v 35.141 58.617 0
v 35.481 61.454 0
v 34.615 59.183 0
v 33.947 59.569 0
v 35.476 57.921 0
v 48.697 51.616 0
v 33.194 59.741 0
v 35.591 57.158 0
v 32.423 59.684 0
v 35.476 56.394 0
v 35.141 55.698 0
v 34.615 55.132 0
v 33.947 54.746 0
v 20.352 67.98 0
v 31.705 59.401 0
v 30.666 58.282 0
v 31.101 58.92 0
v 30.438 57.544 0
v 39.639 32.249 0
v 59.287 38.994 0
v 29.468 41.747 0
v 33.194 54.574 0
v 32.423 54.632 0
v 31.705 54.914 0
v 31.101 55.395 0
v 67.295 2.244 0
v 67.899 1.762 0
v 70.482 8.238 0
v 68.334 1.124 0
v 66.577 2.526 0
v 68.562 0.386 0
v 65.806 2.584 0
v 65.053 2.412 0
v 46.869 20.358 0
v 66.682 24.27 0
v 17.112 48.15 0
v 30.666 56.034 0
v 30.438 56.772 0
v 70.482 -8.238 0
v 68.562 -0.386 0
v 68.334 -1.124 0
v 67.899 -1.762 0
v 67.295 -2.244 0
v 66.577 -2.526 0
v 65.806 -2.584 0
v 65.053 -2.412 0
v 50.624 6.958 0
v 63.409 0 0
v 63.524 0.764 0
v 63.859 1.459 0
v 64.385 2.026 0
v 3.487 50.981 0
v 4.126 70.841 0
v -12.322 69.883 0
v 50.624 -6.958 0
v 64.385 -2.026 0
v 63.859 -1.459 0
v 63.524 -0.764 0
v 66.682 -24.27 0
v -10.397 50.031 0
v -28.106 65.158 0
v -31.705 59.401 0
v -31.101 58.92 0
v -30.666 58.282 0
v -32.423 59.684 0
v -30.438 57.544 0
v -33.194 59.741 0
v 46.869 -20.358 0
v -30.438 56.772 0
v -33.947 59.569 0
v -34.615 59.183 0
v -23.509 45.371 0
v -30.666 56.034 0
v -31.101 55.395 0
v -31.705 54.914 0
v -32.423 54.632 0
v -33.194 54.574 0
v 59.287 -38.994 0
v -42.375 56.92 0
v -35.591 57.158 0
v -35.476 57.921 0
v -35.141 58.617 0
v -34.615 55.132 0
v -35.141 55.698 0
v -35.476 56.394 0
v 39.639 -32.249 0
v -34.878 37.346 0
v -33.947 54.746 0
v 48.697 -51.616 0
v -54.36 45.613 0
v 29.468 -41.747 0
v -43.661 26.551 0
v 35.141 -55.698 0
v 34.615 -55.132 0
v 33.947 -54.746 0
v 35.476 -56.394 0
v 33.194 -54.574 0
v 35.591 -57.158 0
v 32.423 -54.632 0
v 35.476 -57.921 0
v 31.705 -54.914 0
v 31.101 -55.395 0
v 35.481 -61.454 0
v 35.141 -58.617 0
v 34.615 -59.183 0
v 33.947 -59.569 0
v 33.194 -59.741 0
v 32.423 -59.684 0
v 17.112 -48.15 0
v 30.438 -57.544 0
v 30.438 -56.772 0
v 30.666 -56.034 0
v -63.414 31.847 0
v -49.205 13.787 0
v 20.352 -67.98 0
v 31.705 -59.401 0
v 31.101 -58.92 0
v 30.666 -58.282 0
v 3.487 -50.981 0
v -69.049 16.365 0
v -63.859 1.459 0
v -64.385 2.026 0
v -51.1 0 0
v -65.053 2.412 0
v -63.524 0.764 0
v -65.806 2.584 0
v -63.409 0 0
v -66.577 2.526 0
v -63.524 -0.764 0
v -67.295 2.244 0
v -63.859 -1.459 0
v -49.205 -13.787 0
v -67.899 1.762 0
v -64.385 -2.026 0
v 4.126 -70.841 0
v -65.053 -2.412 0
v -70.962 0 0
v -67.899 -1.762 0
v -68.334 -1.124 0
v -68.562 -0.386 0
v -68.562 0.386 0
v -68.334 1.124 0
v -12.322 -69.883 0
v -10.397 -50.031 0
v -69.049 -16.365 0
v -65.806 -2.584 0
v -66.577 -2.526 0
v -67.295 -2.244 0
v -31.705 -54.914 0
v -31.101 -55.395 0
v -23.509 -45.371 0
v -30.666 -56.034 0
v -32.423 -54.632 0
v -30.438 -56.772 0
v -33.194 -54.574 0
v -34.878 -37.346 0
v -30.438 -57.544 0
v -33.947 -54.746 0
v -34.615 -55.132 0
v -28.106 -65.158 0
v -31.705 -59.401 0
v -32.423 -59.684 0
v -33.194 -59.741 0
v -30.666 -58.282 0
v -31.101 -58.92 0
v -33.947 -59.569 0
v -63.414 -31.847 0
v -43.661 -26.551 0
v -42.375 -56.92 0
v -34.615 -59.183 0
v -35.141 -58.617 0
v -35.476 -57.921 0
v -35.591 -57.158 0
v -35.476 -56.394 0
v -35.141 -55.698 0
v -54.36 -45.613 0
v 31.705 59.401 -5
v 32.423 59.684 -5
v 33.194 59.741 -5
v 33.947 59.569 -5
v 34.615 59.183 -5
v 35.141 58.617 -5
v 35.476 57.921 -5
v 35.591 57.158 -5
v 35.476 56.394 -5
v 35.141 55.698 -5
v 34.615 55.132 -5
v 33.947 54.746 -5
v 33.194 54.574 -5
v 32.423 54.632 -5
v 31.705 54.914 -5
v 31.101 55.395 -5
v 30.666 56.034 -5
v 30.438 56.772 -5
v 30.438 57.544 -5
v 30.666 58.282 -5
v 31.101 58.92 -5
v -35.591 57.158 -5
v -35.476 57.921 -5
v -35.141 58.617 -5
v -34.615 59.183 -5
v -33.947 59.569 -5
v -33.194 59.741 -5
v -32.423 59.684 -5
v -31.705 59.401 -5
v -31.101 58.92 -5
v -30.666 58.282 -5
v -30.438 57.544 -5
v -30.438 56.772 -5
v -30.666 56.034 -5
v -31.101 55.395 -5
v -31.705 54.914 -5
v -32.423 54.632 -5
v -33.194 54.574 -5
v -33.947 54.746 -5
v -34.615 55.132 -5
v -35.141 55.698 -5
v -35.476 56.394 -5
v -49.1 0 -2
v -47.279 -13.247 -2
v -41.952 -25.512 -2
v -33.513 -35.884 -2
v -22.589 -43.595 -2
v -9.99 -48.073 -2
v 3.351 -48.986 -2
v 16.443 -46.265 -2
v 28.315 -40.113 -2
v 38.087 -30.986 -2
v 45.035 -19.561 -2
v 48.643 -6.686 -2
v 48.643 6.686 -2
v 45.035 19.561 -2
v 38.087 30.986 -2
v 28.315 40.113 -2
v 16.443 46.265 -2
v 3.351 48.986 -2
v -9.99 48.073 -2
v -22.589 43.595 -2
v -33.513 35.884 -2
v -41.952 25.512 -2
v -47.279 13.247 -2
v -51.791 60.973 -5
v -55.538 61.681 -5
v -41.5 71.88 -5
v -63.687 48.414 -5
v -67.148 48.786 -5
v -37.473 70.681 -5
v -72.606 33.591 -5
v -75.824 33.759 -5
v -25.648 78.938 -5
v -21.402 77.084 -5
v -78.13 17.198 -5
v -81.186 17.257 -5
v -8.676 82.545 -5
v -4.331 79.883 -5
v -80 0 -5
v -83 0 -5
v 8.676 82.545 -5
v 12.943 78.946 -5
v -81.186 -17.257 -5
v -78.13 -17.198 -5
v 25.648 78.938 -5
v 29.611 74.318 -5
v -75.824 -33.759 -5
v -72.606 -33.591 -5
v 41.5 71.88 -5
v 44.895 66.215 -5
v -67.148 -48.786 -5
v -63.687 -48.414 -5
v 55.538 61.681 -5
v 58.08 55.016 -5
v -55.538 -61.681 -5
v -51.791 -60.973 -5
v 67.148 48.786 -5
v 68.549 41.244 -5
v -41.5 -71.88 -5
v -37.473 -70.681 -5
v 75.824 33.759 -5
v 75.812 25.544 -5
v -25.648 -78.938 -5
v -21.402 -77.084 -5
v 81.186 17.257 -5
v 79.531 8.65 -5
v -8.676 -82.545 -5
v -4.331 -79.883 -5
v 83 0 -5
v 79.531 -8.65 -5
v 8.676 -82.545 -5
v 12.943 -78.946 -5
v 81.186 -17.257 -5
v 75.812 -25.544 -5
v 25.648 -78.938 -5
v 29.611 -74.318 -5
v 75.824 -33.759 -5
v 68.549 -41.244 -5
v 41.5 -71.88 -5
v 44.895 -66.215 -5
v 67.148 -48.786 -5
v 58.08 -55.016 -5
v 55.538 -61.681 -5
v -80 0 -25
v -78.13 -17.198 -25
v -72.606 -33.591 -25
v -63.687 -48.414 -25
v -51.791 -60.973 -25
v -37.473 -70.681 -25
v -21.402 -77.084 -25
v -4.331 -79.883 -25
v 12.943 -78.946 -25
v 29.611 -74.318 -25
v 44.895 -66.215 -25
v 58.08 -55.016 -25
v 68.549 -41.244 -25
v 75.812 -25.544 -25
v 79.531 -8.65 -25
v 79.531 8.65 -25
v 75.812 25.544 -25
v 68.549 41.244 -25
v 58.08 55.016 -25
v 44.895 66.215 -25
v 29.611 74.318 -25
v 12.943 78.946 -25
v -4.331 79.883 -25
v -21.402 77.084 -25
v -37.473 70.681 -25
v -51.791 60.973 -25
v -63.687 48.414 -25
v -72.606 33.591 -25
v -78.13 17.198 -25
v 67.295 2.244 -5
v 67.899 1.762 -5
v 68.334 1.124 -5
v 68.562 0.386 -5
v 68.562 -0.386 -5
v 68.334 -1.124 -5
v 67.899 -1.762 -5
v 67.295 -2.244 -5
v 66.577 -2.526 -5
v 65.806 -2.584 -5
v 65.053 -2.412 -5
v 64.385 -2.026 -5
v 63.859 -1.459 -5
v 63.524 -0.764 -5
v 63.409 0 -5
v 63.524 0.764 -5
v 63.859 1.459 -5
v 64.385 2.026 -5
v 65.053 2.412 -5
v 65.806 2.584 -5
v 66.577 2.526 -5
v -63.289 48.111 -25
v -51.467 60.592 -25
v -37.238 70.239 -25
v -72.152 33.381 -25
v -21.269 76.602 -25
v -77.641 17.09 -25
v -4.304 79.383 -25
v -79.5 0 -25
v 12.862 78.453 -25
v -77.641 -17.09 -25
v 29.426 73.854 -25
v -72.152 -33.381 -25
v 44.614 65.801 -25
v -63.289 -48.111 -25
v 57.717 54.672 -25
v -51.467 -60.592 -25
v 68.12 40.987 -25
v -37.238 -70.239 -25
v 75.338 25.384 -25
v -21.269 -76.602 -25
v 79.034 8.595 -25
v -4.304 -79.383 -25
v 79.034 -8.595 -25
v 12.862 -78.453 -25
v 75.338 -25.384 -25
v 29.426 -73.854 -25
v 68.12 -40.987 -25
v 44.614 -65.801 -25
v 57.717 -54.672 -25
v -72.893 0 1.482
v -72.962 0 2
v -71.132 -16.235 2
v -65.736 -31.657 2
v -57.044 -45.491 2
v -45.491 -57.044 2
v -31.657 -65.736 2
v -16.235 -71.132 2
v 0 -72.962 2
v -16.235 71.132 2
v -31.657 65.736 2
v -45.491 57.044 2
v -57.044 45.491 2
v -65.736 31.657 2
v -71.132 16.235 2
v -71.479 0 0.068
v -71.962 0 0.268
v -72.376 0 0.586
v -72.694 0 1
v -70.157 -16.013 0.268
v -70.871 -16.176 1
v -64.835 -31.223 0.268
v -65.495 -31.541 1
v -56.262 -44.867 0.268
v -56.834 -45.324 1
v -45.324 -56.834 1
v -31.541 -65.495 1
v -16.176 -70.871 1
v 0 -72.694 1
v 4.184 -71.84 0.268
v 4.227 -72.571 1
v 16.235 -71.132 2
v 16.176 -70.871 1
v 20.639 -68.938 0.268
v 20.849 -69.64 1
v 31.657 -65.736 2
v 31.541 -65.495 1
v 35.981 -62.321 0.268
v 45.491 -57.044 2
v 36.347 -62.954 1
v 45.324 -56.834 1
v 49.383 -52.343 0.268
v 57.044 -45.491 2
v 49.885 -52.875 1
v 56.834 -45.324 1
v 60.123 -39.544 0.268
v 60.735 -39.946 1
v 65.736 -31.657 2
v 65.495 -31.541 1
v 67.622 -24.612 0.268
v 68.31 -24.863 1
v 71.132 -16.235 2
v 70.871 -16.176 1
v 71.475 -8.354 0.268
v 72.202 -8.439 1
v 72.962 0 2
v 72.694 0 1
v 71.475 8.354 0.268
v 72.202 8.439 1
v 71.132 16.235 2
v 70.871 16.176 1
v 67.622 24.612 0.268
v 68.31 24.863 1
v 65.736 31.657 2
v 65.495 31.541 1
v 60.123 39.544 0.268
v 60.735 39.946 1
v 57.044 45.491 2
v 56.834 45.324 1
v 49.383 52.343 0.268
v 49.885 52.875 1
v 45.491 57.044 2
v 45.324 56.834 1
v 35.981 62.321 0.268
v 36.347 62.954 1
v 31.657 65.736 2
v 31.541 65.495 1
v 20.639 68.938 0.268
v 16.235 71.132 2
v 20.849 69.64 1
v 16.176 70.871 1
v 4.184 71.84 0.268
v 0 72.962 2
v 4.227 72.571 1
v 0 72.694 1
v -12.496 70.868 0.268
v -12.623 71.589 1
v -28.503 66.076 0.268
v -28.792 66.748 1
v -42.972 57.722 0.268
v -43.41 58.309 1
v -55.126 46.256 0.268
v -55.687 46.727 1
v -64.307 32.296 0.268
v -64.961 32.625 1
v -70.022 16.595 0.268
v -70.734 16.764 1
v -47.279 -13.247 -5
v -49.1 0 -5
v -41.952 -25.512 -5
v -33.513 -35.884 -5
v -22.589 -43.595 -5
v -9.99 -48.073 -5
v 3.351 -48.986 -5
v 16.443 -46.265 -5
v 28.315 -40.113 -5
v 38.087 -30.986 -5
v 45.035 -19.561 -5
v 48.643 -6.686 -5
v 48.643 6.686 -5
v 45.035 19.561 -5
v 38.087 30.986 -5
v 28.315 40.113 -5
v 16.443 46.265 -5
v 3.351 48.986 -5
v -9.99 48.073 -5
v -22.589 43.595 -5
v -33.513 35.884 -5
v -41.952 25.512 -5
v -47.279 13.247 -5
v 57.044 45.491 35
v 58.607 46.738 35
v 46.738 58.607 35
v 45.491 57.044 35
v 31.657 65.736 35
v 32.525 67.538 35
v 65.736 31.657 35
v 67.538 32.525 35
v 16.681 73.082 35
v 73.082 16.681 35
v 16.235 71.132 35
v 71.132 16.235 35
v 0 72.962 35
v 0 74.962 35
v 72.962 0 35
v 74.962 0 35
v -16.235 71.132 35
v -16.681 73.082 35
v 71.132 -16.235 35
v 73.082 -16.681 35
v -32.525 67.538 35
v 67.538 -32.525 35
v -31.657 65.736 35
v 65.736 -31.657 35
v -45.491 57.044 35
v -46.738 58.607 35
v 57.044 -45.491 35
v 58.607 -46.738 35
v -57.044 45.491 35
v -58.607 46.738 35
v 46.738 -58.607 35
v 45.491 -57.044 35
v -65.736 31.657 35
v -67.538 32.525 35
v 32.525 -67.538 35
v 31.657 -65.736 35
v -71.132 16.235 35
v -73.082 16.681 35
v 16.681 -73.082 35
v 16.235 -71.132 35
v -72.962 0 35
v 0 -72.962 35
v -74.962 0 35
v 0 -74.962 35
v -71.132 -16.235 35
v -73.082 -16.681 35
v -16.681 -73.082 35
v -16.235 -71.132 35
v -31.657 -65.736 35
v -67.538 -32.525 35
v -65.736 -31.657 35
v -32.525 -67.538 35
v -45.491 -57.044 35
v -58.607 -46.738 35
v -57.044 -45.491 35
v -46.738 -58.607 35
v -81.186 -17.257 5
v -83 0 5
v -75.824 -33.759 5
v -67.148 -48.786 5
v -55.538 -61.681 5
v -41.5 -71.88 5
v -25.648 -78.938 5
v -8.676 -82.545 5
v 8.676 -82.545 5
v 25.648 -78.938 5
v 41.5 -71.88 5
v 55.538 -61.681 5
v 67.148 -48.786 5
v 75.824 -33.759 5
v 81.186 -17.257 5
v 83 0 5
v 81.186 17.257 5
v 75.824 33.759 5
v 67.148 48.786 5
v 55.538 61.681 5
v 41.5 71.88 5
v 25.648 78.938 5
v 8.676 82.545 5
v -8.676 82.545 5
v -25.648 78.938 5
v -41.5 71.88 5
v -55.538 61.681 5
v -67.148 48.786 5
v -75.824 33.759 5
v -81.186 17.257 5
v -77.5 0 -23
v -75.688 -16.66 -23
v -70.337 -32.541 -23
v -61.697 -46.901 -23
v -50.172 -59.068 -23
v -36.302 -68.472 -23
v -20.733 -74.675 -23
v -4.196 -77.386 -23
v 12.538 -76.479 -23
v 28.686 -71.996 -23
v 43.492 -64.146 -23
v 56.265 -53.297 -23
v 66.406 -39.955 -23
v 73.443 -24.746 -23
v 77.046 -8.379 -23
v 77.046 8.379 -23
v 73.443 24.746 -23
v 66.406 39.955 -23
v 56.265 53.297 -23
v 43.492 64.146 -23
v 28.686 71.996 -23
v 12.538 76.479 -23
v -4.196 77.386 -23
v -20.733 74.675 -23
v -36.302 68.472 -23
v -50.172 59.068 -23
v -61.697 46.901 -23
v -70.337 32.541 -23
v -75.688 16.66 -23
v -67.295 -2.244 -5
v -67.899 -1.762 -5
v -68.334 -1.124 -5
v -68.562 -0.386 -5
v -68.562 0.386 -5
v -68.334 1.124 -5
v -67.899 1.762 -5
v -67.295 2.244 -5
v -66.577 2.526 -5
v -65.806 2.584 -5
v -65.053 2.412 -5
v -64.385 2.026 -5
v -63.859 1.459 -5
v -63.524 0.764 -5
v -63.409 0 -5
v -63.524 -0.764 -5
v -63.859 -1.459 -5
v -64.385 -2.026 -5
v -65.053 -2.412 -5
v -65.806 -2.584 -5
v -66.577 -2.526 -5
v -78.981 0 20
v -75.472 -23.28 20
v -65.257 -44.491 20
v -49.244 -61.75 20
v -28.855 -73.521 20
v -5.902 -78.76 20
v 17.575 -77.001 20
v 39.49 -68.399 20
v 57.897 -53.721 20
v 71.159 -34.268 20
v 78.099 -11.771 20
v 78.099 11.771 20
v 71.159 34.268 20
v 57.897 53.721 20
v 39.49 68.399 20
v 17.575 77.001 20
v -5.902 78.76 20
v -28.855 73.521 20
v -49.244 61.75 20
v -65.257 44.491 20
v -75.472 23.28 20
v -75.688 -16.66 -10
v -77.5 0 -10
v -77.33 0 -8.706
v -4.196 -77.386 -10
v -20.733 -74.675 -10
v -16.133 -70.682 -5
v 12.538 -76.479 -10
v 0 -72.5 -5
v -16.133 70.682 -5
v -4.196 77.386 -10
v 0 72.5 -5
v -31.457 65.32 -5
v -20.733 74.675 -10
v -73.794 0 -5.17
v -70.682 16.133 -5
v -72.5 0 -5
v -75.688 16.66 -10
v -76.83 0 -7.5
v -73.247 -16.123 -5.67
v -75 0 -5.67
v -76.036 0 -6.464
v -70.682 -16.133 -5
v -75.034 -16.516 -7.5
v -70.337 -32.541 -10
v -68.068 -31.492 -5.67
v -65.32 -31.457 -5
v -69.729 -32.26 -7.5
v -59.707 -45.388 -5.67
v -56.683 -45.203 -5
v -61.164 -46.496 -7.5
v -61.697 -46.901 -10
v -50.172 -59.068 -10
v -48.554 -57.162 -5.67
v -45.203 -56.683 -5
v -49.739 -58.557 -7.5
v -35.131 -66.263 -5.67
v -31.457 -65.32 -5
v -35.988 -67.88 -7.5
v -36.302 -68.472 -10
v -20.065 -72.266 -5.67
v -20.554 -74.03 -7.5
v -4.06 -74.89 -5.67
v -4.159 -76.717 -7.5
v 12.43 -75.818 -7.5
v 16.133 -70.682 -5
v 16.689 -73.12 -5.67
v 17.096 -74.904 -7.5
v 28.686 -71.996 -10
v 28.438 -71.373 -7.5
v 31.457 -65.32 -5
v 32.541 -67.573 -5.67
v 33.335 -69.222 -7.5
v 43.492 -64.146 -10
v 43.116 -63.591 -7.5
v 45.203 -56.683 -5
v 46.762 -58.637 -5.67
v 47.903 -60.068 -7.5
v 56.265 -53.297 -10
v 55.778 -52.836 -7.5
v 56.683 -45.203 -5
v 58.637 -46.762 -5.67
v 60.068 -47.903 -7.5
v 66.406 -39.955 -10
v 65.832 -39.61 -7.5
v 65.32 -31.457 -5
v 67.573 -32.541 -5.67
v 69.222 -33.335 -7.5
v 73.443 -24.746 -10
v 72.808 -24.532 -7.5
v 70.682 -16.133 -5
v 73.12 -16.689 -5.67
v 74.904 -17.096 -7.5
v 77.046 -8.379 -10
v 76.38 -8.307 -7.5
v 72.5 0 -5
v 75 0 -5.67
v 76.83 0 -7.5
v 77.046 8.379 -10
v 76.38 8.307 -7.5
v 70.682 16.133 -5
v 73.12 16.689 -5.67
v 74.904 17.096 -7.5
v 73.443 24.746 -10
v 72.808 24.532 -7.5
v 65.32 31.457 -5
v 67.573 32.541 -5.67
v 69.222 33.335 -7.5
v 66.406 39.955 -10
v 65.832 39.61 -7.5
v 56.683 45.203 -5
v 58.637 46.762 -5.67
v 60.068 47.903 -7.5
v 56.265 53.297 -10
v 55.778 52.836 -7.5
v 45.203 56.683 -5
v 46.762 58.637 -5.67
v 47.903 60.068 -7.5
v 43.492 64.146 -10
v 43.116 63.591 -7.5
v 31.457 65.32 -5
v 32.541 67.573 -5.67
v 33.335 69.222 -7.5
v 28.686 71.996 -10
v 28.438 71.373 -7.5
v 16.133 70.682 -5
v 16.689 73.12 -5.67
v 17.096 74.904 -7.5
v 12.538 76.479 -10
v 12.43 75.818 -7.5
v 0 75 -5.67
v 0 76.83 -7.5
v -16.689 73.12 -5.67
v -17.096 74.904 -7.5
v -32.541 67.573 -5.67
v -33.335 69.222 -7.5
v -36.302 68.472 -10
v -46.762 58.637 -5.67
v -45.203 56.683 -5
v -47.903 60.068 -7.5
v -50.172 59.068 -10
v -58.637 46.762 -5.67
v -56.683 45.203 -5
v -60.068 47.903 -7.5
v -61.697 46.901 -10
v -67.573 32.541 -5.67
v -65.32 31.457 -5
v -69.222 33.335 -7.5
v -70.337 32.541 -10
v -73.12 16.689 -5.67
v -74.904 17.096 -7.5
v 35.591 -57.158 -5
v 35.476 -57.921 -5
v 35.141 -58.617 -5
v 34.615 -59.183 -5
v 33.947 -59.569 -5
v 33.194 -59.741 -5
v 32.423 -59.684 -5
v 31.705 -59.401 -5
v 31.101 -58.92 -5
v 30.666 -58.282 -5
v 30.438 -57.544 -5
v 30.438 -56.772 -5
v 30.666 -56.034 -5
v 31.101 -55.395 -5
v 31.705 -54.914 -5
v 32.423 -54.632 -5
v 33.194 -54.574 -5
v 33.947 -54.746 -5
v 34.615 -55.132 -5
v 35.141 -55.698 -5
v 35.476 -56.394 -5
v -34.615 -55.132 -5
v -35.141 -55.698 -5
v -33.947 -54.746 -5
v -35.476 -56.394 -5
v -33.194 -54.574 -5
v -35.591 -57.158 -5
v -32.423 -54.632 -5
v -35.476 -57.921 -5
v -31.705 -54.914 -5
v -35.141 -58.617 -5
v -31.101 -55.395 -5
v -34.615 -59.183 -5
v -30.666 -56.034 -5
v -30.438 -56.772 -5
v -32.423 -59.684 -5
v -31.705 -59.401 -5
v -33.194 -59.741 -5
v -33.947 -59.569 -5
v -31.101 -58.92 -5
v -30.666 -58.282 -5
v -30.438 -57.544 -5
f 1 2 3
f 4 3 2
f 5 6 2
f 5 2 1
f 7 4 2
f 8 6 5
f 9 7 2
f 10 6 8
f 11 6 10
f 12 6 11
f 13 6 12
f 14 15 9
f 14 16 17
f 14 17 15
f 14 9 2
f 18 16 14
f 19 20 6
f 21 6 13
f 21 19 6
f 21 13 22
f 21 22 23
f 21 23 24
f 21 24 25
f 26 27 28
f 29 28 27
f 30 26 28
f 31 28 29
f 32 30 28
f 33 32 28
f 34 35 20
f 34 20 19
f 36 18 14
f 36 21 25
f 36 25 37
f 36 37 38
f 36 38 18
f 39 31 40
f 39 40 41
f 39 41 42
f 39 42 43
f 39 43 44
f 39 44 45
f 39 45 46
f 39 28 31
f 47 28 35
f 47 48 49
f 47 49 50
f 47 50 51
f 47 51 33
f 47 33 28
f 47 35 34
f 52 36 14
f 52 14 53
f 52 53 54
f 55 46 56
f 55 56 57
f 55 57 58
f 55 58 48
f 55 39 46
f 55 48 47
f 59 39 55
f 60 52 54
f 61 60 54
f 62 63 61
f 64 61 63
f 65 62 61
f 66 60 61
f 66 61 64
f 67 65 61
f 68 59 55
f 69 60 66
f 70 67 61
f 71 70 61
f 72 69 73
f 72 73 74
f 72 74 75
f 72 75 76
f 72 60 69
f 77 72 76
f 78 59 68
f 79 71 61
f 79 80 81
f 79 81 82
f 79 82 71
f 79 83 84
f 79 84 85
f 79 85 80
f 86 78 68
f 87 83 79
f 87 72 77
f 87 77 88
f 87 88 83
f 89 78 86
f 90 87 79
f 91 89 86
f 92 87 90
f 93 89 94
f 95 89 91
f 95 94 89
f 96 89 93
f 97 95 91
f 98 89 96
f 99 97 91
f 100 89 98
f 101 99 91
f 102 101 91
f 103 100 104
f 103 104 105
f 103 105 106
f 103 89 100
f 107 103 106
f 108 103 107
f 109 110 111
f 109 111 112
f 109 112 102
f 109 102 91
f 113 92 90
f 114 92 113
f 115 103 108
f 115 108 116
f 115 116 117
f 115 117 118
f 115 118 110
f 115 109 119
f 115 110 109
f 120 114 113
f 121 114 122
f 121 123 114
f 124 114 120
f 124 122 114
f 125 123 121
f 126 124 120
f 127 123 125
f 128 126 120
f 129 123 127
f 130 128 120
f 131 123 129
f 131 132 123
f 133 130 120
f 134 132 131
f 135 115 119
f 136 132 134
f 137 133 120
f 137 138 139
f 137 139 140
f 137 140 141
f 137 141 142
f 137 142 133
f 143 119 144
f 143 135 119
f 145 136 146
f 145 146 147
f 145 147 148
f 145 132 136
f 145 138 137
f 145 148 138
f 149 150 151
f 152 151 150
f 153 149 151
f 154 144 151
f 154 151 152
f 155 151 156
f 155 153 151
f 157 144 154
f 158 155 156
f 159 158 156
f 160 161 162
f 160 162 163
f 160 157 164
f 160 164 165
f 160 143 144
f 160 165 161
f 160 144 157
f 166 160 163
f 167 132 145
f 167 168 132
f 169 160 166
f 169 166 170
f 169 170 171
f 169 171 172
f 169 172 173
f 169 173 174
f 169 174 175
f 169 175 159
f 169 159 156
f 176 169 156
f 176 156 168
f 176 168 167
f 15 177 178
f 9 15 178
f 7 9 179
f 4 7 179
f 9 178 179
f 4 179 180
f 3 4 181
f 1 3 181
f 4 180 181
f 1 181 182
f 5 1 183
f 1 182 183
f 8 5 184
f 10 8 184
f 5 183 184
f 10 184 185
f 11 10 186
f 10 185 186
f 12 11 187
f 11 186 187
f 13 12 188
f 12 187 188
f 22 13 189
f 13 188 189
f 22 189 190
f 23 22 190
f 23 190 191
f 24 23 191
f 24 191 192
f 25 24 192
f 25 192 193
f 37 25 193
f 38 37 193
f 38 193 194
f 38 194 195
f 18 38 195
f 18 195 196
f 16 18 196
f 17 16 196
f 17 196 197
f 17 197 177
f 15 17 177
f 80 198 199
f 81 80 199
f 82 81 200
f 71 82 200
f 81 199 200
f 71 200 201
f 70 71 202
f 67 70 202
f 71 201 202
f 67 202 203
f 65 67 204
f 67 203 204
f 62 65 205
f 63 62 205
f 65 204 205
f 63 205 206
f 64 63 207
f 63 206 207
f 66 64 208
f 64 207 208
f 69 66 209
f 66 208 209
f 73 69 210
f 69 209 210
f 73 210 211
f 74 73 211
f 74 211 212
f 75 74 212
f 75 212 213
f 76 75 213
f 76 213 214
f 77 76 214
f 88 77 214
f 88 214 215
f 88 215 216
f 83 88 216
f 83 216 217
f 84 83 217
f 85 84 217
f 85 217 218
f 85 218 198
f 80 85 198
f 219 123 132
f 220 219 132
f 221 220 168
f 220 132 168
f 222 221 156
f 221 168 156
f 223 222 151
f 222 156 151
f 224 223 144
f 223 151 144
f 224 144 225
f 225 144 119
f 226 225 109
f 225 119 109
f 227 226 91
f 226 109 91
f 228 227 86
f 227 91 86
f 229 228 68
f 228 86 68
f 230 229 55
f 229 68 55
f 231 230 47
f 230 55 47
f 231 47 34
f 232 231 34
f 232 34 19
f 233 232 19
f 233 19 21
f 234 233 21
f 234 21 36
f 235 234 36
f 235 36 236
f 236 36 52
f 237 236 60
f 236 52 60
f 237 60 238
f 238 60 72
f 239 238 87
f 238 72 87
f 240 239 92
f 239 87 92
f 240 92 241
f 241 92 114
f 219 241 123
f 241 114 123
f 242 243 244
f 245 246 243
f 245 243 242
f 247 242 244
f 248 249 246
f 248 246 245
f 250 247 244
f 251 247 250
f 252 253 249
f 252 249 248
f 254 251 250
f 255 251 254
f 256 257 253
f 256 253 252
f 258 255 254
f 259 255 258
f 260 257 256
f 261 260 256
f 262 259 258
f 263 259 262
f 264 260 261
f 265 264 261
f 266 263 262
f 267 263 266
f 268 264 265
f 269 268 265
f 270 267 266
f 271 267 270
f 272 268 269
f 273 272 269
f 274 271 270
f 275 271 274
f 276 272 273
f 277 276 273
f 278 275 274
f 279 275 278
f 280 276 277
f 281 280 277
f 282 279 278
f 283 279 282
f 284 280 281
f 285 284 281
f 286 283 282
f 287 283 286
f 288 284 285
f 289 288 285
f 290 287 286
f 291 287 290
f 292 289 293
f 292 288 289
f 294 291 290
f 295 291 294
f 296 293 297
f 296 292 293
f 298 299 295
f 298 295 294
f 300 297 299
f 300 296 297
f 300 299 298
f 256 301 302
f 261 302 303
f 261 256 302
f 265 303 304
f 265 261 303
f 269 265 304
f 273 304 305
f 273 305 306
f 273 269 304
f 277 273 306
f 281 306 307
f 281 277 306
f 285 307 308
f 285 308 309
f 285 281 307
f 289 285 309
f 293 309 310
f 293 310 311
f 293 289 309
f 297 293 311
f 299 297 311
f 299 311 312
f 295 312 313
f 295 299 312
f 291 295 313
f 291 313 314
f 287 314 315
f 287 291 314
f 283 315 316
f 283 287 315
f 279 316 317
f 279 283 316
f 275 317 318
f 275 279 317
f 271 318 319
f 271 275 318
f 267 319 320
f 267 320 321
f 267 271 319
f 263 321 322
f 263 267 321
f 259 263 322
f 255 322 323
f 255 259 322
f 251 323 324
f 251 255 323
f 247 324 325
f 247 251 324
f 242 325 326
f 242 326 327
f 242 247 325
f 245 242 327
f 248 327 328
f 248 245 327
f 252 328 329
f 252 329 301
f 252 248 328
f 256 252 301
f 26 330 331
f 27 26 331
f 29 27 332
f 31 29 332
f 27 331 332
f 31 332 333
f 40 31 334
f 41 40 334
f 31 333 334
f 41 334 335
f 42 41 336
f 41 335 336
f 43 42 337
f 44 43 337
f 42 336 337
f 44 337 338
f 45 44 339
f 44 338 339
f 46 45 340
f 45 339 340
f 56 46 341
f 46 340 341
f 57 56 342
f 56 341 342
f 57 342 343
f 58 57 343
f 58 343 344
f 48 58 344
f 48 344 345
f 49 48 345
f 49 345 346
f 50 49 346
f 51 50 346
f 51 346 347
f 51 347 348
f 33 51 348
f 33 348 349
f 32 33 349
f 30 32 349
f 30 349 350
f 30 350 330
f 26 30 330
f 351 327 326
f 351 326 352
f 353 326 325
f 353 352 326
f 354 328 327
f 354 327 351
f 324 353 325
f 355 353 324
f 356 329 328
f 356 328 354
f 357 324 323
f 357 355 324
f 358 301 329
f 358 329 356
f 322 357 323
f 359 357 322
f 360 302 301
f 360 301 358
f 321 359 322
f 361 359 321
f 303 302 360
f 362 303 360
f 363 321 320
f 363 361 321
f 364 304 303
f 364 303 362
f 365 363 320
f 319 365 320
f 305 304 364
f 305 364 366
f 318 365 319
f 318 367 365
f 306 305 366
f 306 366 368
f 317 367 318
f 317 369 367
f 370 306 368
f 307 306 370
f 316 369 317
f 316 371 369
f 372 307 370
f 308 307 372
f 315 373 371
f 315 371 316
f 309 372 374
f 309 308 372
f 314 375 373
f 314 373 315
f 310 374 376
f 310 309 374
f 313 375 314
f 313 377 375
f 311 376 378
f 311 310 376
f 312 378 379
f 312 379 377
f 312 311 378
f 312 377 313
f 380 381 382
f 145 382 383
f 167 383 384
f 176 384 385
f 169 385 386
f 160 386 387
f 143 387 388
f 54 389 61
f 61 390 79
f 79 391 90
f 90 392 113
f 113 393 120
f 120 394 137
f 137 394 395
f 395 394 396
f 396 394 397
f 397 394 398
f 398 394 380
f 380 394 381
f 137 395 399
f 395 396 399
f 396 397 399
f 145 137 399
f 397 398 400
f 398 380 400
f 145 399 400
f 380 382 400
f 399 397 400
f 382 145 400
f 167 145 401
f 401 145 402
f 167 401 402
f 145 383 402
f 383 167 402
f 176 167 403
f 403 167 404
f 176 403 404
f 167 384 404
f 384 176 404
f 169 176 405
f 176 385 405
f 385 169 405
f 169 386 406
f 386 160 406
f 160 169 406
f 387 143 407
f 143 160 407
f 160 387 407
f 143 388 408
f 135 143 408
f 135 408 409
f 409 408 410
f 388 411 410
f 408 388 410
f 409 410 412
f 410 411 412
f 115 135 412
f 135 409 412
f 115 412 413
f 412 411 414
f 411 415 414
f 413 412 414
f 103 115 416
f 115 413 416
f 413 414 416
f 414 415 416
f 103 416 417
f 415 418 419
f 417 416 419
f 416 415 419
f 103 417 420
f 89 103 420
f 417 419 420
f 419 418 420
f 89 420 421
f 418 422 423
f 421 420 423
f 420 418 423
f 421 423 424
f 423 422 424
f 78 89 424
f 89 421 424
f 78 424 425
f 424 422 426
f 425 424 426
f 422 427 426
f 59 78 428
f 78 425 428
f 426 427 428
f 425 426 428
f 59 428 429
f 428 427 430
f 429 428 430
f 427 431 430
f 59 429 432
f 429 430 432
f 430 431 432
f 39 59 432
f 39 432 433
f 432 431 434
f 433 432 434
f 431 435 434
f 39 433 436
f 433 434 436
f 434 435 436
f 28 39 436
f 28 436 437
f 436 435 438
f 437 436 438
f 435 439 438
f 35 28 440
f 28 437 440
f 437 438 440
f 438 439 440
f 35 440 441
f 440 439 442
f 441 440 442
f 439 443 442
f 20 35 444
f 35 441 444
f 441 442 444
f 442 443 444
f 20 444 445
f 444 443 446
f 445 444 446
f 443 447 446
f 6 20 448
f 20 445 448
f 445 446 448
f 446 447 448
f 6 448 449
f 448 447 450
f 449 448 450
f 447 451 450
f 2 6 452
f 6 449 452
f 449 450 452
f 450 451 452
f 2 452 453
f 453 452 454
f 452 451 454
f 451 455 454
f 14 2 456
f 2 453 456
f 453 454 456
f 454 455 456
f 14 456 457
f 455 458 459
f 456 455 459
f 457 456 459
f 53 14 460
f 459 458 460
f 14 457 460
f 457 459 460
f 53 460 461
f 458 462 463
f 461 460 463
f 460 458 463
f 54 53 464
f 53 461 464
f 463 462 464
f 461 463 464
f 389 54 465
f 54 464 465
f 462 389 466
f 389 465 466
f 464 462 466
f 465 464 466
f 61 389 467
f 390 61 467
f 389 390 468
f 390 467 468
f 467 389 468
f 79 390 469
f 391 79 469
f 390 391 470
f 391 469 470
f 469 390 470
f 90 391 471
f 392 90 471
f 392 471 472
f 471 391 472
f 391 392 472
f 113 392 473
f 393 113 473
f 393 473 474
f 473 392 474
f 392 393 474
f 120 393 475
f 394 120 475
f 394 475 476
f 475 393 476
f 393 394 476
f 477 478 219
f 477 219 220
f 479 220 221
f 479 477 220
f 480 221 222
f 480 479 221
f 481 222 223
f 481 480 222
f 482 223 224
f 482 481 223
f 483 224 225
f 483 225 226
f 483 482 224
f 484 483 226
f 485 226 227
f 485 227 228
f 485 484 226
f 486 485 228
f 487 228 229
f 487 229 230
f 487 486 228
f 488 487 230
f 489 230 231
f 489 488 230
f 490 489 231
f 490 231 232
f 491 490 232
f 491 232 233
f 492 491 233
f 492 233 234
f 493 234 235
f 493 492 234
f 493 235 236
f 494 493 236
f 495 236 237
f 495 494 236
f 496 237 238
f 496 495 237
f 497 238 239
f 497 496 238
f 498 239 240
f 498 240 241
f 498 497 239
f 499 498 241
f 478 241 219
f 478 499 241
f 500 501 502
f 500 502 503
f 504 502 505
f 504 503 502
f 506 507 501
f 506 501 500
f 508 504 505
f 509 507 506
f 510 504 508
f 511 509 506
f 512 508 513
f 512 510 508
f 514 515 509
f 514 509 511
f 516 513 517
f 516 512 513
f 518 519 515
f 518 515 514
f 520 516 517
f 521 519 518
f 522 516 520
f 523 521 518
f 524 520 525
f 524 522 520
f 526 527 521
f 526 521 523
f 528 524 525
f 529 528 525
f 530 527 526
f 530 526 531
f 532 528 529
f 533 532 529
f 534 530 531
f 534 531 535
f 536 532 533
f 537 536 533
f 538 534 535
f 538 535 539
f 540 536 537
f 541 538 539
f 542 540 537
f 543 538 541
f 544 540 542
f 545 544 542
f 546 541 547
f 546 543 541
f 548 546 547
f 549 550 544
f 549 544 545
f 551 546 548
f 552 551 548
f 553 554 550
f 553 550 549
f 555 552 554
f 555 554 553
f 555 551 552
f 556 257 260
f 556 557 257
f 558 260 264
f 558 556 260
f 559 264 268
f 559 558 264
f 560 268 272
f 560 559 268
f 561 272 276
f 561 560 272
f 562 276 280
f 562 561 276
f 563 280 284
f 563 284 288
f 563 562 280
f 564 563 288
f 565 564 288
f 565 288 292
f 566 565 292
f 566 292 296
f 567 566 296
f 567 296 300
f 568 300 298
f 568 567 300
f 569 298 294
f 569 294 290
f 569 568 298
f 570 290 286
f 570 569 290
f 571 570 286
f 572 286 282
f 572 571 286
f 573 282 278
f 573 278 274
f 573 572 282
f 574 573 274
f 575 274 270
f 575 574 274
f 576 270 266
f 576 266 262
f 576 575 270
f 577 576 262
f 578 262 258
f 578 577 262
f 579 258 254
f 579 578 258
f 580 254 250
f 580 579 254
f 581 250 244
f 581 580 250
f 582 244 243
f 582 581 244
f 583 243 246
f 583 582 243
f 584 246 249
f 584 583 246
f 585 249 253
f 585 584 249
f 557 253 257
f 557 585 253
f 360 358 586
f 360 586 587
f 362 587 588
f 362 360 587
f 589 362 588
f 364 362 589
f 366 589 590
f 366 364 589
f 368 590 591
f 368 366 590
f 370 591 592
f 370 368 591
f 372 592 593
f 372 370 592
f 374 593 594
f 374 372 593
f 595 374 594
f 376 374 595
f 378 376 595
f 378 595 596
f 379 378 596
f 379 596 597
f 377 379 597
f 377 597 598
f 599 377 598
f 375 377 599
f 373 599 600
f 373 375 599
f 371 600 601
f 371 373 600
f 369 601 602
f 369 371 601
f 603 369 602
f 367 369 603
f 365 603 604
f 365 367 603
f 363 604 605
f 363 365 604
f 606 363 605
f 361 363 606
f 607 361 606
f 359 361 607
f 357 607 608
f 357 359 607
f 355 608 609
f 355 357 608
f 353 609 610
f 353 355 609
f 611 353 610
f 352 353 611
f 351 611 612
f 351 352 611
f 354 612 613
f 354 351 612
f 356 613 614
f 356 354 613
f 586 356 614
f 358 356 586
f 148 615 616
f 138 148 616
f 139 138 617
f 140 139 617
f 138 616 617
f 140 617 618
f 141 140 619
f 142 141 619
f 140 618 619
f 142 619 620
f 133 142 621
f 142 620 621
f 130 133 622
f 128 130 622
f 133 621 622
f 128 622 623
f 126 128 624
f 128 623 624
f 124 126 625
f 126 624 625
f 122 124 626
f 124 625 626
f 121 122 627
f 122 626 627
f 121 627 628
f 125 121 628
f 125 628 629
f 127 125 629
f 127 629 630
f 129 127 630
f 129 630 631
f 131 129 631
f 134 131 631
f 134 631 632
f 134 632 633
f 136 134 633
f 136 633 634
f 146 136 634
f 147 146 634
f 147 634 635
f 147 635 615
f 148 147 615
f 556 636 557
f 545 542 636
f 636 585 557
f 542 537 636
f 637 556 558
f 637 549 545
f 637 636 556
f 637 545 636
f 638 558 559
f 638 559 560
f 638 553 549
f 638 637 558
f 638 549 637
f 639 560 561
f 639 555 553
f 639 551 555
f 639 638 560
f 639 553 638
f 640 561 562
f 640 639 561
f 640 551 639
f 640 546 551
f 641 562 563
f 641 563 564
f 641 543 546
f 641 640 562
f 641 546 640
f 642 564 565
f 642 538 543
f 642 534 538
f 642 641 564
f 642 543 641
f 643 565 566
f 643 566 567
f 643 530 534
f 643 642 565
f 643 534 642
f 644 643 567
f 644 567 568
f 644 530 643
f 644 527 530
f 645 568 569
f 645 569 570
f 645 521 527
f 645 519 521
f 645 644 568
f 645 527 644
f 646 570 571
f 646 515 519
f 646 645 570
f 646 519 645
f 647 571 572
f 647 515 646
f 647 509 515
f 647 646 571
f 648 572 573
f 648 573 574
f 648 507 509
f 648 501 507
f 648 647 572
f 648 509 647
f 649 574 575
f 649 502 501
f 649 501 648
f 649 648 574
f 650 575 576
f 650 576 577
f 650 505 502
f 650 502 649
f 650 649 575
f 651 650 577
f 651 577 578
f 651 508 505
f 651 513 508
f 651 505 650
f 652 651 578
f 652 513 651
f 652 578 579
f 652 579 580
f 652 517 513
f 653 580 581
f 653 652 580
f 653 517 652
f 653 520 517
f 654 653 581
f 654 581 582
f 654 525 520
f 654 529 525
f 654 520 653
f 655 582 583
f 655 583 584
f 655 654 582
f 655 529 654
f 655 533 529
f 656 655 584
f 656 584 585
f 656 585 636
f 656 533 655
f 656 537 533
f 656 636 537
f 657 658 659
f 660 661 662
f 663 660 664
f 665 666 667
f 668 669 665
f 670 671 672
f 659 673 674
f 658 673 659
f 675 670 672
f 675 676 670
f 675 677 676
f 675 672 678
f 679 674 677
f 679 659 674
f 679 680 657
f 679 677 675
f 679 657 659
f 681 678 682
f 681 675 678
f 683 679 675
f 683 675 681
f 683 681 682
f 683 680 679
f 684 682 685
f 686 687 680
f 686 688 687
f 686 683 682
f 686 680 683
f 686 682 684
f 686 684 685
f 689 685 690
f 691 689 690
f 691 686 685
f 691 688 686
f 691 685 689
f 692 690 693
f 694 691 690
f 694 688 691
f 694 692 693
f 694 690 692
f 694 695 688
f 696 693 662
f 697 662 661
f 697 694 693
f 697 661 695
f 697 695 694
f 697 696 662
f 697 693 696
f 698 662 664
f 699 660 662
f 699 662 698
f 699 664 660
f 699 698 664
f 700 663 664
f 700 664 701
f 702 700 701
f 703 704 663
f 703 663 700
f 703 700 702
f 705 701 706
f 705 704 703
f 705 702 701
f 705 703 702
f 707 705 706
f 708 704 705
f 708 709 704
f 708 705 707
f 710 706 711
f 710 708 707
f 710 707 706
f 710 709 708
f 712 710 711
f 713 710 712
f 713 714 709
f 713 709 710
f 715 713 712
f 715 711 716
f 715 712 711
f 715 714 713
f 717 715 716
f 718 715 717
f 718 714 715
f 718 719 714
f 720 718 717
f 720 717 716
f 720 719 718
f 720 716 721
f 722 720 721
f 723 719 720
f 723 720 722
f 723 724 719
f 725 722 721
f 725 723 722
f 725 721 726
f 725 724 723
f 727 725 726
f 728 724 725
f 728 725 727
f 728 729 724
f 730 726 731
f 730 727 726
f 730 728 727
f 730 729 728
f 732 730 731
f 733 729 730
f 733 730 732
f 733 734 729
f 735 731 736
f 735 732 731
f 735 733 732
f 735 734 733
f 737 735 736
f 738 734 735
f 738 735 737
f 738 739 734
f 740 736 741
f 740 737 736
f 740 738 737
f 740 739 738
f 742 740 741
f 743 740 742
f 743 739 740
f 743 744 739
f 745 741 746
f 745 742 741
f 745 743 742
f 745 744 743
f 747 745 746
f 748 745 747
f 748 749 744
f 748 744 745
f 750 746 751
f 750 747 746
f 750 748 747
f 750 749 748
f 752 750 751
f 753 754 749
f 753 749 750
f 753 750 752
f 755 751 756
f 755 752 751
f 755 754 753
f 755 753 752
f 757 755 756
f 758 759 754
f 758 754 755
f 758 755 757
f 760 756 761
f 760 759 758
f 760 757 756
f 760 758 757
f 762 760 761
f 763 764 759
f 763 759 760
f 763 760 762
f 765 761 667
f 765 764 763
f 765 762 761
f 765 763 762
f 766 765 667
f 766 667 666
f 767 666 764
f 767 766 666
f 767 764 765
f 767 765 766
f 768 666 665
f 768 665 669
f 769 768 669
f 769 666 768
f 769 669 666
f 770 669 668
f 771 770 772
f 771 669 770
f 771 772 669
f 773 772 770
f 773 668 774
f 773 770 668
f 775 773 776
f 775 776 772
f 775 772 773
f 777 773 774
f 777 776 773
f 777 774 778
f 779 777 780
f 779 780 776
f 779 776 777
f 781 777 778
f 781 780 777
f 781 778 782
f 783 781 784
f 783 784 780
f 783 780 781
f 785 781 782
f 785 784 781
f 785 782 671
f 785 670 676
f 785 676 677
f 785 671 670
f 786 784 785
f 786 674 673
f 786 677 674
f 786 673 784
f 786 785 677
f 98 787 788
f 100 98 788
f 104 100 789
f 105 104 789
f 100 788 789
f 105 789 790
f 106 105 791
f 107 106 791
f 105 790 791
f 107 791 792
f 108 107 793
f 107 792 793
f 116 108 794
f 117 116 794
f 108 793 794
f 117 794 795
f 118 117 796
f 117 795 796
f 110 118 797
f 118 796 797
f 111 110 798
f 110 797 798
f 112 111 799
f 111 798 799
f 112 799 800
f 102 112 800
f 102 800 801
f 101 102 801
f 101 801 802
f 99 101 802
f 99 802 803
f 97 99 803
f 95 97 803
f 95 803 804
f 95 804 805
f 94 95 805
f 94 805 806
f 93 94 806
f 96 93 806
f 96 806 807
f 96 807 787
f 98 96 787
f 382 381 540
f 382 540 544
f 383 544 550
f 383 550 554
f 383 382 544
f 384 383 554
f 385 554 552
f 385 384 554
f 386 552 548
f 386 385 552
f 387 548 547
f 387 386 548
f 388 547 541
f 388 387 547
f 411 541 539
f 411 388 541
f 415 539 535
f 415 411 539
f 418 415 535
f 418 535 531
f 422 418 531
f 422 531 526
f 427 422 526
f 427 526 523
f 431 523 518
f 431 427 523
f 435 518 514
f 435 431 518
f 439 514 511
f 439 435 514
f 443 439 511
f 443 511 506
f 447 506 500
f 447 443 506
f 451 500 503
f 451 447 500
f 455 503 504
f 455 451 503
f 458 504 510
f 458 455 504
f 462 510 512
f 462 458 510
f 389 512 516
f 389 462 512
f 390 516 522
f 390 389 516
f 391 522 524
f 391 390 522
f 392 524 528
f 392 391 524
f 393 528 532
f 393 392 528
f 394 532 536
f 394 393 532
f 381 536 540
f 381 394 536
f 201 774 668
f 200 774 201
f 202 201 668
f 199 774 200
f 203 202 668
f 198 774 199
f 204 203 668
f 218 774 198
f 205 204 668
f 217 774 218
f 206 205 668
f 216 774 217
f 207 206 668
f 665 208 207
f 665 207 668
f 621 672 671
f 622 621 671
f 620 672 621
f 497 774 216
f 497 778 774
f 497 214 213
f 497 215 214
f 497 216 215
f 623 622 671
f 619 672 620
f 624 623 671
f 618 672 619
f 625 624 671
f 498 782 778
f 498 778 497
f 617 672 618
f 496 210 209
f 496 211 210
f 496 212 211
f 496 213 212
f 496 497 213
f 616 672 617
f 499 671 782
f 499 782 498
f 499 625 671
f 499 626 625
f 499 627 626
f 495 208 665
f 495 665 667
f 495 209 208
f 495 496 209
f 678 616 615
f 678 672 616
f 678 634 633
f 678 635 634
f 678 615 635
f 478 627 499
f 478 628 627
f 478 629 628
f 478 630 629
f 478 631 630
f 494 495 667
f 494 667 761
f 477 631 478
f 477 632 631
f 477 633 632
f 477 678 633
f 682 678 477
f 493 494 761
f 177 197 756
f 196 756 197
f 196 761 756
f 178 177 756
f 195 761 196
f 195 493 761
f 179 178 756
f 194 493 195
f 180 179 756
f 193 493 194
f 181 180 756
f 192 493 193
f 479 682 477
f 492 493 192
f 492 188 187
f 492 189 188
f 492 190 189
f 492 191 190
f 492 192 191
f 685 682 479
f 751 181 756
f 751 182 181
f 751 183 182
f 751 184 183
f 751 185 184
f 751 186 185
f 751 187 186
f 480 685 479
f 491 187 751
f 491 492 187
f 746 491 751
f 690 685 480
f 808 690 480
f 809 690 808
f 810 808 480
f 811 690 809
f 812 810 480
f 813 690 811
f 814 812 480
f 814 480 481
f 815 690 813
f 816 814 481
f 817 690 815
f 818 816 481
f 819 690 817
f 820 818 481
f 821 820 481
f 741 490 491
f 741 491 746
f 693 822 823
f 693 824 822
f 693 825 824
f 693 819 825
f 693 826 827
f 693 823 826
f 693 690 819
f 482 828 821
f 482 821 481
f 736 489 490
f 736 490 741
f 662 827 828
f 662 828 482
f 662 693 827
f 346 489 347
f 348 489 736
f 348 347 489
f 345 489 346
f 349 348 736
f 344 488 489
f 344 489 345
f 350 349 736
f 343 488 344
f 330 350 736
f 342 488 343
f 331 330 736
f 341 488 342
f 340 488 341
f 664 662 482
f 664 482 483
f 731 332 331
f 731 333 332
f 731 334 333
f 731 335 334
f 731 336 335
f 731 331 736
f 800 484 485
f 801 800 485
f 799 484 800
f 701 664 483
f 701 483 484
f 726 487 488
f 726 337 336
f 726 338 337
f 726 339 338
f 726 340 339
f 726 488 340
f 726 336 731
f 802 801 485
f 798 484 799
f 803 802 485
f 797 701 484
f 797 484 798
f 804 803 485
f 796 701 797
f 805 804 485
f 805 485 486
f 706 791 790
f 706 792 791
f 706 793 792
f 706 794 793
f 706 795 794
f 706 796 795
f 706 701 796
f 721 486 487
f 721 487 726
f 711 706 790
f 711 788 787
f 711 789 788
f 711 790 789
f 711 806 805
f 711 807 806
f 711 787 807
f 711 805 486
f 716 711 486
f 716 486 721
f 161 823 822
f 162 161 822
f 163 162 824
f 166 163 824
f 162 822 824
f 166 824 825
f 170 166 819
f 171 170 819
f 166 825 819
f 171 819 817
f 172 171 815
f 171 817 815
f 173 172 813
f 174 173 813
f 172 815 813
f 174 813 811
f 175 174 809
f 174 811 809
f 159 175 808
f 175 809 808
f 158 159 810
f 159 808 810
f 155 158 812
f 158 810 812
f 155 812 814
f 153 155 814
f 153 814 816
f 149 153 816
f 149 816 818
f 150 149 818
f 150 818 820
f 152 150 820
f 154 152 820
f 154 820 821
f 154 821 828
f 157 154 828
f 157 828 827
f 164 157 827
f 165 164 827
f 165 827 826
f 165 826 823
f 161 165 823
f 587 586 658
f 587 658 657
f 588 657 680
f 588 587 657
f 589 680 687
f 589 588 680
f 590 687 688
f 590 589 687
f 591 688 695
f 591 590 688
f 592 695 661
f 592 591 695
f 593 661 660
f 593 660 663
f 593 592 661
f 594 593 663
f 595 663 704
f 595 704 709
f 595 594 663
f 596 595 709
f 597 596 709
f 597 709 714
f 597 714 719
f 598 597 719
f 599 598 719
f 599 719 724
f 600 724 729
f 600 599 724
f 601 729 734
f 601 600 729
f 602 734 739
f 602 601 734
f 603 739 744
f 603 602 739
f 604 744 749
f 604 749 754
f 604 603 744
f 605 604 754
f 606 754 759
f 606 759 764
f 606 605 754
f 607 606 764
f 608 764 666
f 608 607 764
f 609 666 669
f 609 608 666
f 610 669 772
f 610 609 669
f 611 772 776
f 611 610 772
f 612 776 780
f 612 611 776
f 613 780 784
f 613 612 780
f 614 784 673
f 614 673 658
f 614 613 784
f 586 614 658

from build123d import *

# Parameters (mm, degrees)
CHAMFER1_SIZE              = 2
CHAMFER2_SIZE              = 2
F_6_0_204_DIAMETER_HOLE1_D = 5.1816
CIRPATTERN1_COUNT          = 6
FILLET2_R                  = 5
FILLET3_R                  = 2


with BuildPart() as part:
    # Sketch2 → Revolve1 (revolve)
    with BuildSketch(Plane(origin=(0, 0, 0), x_dir=(0, 0, -1), z_dir=(1, 0, 0)), mode=Mode.PRIVATE) as revolve1_sk:
        Polygon((-5, 83), (-35, 74.961524227), (-35, 72.961524227), (0, 72.961524227), (0, 49.1), (5, 49.1), (5, 77.5), (25, 77.5), (25, 80), (5, 80), (5, 83), align=None)
    revolve(revolve1_sk.sketch.rotate(Axis((0, 0, -77), (0, 0, 1)), 90), axis=Axis((0, 0, -77), (0, 0, 1)))

    # Chamfer1
    chamfer1_edges = [part.edges().sort_by_distance(p)[0] for p in [
        (77.5, 0, -25),
    ]]
    chamfer(chamfer1_edges, length=CHAMFER1_SIZE)

    # Chamfer2
    chamfer2_edges = [part.edges().sort_by_distance(p)[0] for p in [
        (49.1, 0, 0),
    ]]
    chamfer(chamfer2_edges, length=CHAMFER2_SIZE)

    # #6 (0.204) Diameter Hole1 (through all)
    with Locations(Plane.XY):
        with Locations((-33, 57.15767665)):
            f_6_0_204_diameter_hole1 = Hole(F_6_0_204_DIAMETER_HOLE1_D / 2)

    # CirPattern1: #6 (0.204) Diameter Hole1 ×6 about axis
    cirpattern1_axis = Axis((0, 0, 0), (0, 0, 1))
    for i in range(1, CIRPATTERN1_COUNT):
        add(f_6_0_204_diameter_hole1.rotate(cirpattern1_axis, i * 360 / CIRPATTERN1_COUNT), mode=Mode.SUBTRACT)

    # Fillet2
    fillet2_edges = [part.edges().sort_by_distance(p)[0] for p in [
        (77.5, 0, -5),
    ]]
    fillet(fillet2_edges, radius=FILLET2_R)

    # Fillet3
    fillet3_edges = [part.edges().sort_by_distance(p)[0] for p in [
        (72.961524227, 0, 0),
    ]]
    fillet(fillet3_edges, radius=FILLET3_R)


solid = part.part
